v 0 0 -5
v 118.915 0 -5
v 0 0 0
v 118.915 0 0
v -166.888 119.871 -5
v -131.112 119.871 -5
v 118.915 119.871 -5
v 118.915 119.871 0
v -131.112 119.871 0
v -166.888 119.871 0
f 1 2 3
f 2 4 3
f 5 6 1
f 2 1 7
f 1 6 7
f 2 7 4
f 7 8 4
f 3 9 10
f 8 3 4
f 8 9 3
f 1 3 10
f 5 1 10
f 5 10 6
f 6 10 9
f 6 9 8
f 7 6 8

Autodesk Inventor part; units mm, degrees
ref_plane "YZ Plane" through (0, 0, 0) normal (1, 0, 0) x (0, 1, 0)
ref_plane "XZ Plane" through (0, 0, 0) normal (0, 1, 0) x (-1, 0, 0)
ref_plane "XY Plane" through (0, 0, 0) normal (0, 0, 1) x (1, 0, 0)
sketch "Sketch1" plane through (0, 0, 0) normal (0, 0, 1) x (1, 0, 0)
  line L0 (0, 0) -> (-166.8883, 119.871)
  line L1 (-166.8883, 119.871) -> (118.9149, 119.871)
  line L2 (118.9149, 119.871) -> (118.9149, 0)
  line L3 (118.9149, 0) -> (0, 0)
  line L4 (385.7085, 119.871) -> (-223.8915, 119.871) projected
  line L5 (-0.2224, 6.0906) -> (-134.4097, 122.7379) projected
  line L6 (159.6989, 0) -> (330.9455, 0) projected
  line L7 (-119.1192, 85.4511) -> (-192.965, 138.6604) projected
extrude "Extrusion1" add sketch "Sketch1" against normal blind 5
properties part number "frontLeftSidePlateV2"
